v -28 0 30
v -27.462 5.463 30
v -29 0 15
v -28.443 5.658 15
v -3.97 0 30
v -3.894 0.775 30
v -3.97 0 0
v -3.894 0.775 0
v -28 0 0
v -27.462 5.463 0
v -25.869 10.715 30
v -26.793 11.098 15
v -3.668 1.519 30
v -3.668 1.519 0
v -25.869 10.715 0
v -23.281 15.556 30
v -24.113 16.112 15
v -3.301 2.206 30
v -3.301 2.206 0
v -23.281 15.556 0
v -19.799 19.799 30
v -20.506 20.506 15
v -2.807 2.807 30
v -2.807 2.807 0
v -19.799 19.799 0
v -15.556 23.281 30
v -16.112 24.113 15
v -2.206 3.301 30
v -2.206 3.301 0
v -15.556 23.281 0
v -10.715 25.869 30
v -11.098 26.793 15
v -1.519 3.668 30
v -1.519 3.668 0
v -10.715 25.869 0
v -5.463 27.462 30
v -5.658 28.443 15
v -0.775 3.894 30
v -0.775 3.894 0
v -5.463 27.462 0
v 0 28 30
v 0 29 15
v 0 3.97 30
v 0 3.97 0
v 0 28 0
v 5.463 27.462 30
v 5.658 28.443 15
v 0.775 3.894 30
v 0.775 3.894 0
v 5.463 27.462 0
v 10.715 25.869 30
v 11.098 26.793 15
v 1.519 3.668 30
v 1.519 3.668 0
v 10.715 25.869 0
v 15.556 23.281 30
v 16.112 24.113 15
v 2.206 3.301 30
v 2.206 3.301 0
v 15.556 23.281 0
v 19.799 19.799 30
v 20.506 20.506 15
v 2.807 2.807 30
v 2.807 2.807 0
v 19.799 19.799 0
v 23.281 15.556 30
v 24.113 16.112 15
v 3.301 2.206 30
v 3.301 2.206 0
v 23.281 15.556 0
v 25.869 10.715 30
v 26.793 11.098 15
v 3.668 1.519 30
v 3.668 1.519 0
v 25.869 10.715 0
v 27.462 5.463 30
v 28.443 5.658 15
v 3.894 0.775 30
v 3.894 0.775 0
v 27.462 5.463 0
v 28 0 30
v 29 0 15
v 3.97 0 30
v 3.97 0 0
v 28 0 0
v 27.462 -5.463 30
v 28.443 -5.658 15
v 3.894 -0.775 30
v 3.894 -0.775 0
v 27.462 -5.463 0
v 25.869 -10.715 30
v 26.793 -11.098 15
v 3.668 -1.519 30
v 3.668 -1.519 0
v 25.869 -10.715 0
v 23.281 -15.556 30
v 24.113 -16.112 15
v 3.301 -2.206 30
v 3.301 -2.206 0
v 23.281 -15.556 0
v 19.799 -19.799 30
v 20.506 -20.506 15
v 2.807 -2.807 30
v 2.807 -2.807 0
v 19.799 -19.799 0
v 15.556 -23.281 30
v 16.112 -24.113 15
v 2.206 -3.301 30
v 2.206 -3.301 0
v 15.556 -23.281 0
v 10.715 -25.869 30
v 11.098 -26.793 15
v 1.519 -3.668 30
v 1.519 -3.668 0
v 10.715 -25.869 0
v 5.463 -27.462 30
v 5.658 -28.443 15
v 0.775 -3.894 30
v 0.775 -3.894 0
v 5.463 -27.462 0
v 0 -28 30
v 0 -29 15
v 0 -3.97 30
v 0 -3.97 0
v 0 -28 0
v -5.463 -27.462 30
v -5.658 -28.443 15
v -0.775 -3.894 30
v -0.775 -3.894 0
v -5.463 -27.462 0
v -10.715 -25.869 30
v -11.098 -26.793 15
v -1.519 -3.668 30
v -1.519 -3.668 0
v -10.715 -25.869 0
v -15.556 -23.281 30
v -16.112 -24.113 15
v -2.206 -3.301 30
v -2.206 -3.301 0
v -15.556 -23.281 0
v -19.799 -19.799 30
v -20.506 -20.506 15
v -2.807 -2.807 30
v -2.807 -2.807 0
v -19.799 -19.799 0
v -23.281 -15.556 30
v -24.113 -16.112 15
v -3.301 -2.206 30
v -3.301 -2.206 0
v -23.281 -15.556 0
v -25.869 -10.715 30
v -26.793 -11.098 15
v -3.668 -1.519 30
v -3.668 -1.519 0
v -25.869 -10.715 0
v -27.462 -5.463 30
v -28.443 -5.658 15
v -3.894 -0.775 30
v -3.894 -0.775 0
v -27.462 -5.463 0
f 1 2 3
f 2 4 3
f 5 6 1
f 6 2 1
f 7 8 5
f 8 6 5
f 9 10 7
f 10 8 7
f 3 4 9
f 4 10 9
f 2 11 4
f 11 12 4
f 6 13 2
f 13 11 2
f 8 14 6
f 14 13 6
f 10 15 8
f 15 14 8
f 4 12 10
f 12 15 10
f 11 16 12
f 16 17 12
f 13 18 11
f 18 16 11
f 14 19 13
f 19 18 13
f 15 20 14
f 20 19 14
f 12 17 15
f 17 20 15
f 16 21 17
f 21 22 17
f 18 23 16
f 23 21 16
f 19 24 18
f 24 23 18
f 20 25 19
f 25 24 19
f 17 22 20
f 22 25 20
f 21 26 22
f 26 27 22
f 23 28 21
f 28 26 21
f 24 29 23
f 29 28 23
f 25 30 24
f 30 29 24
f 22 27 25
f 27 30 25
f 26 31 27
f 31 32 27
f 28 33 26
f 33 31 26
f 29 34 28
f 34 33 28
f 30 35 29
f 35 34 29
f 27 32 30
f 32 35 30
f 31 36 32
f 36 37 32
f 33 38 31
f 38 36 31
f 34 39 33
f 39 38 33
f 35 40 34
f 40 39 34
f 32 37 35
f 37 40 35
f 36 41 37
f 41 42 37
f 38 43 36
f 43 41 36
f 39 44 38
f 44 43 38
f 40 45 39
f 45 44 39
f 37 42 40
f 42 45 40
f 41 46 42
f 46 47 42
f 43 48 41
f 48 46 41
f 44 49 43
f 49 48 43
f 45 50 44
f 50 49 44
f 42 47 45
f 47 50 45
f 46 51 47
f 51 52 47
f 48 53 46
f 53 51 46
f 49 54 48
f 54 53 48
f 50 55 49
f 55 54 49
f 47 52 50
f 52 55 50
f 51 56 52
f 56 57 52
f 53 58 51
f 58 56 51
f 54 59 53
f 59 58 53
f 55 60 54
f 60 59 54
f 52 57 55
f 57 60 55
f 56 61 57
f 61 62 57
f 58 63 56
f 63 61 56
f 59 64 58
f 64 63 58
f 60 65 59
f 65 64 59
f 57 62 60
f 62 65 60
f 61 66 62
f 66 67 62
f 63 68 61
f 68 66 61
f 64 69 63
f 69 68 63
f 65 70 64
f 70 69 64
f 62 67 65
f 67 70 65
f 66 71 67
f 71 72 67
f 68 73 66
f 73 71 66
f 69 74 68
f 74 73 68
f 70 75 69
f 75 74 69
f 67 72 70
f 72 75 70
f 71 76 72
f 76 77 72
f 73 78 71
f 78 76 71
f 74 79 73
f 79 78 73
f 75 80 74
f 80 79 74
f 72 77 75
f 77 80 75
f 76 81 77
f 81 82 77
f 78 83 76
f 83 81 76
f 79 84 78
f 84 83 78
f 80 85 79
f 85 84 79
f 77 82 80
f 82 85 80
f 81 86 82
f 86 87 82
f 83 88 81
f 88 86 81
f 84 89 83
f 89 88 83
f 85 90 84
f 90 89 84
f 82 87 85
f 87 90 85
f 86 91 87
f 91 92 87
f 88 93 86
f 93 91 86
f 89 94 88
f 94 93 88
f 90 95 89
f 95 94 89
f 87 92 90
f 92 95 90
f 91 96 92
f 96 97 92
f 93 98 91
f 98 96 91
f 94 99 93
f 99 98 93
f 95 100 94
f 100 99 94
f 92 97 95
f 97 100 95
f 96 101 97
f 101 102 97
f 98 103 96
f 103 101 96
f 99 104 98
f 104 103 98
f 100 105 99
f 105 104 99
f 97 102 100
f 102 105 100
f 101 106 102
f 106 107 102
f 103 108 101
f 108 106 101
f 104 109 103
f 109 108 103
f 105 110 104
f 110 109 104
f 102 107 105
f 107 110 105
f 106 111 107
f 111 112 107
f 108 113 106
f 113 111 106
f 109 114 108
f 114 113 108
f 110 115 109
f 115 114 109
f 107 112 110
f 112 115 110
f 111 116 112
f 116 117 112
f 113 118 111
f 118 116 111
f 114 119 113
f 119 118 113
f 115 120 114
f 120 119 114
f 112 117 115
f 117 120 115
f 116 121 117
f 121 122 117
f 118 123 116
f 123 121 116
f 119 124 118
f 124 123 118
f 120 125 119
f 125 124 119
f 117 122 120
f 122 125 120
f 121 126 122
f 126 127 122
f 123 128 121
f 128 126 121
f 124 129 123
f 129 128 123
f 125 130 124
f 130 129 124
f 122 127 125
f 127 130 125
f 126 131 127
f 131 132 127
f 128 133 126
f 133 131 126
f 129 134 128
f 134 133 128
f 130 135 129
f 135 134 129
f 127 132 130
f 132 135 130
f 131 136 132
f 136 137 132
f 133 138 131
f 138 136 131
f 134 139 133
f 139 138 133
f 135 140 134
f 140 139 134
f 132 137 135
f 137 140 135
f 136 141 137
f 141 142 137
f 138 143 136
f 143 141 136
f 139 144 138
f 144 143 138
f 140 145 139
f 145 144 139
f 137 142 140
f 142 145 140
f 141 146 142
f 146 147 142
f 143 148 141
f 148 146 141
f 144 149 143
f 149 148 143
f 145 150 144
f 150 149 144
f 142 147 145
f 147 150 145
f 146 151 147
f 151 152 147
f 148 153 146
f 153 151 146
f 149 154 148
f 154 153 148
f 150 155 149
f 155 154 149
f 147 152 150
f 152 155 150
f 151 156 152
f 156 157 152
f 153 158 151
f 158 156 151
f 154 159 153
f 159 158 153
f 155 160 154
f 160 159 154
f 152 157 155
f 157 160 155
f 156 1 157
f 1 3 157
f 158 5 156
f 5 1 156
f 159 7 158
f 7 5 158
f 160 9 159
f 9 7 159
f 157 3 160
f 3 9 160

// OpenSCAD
$fn = 32;

// ----------------------------------------------------------------------
// Belt roller: 56 mm barrel, 30 mm wide, bore 7.94 mm
// ----------------------------------------------------------------------

// --- parameters (mm) ---
bore_d = 7.94;            // bore
barrel_d = 56;            // barrel diameter
roller_w = 30;            // roller width
crown = 1;                // crown height at mid width

roller_profile = [[3.97, 0], [28, 0], [29, 15], [28, 30], [3.97, 30]];

/* the profile stays clear of the axis, so the bore comes out of the revolve */
rotate_extrude() polygon(roller_profile);
